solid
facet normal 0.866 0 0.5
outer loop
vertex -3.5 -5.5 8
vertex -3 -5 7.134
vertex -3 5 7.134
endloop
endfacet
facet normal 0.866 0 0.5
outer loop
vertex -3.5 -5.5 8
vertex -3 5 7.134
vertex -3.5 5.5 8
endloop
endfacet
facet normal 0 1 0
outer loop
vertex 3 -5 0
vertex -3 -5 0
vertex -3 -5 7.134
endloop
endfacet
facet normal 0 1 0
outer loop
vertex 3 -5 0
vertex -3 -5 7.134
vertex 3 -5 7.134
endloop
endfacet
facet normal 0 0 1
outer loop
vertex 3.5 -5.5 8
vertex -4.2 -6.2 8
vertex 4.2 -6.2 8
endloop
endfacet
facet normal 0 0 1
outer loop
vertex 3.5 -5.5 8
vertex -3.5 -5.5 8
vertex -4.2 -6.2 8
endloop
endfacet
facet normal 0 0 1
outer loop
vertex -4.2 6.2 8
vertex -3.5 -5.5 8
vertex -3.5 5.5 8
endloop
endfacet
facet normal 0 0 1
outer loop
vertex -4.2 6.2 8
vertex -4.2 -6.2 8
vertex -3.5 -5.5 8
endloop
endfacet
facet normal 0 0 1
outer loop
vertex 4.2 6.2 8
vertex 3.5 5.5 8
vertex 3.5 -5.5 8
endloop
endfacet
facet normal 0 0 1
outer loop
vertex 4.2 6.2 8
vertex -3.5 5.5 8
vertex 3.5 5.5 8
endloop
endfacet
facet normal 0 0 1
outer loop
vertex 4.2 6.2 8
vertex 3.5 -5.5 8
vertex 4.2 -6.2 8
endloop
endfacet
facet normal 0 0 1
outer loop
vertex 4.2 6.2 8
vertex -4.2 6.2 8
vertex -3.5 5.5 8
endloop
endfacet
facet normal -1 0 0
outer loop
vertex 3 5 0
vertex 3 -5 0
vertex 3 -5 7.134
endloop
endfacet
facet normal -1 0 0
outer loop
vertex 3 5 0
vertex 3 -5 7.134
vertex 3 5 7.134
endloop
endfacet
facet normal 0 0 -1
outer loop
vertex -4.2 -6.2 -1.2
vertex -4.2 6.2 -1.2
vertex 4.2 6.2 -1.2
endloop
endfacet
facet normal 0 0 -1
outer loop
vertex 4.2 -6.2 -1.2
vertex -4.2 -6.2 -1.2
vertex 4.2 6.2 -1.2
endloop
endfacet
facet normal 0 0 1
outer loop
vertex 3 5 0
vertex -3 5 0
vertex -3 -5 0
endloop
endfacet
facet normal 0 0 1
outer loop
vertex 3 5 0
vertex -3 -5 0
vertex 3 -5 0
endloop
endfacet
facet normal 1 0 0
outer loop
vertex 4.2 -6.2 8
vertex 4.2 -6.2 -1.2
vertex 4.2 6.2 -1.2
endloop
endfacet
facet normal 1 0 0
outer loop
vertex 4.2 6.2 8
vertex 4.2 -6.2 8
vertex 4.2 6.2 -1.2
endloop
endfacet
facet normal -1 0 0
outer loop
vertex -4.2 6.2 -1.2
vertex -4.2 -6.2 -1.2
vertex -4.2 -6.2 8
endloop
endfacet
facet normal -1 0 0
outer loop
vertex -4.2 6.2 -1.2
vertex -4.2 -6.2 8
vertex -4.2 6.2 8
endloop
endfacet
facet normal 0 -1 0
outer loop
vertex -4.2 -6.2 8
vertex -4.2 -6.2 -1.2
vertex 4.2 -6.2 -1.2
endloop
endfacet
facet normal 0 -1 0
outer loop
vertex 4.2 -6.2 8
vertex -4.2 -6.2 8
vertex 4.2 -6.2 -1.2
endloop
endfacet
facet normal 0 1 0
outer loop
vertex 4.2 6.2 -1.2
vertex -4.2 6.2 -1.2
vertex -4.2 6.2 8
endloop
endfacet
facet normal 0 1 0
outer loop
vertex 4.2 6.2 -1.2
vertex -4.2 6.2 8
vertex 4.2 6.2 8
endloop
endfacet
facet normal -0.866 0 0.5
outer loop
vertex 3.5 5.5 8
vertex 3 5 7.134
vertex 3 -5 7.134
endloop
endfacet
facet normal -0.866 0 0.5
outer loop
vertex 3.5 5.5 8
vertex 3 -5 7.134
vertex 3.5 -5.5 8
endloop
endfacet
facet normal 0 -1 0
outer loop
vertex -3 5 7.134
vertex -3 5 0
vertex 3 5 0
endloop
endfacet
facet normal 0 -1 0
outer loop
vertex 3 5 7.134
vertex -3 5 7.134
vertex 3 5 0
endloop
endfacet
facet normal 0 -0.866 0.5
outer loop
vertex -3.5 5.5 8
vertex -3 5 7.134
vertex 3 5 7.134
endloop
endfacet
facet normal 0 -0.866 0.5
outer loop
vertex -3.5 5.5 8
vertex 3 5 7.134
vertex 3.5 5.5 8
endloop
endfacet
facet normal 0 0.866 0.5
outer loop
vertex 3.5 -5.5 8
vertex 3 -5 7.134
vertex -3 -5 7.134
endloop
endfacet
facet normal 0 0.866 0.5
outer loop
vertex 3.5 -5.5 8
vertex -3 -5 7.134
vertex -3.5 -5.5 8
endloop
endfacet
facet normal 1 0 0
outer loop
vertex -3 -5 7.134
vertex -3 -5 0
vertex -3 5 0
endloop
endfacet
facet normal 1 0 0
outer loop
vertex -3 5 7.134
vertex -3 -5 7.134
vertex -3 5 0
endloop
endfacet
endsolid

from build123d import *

# Parameters (mm, degrees)
F0_W         = 6
F0_H         = 10
F1_DEPTH     = 8
F2_T         = 1.2
F3_T1_DEPTH  = 6
F3_T3_DEPTH  = 10
F3_T9_DEPTH  = 8.2404819853
F3_T13_DEPTH = 12.2404819853
F3_T20_DEPTH = 8.2404819853
F3_T24_DEPTH = 12.2404819853
F3_T31_DEPTH = 12.2404819853
F3_T35_DEPTH = 8.2404819853
F3_T42_DEPTH = 8.2404819853
F3_T46_DEPTH = 12.2404819853


# Not quite as in the source:
# - a fillet or chamfer that OpenCascade refuses, or shapes differently, is made with other operations: its cross-section is extruded or revolved along the edge and cut away or added


with BuildPart() as f1:
    # F0 (on Top) → F1 (new body)
    with BuildSketch(Plane.XY):
        Rectangle(F0_W, F0_H)
    extrude(amount=F1_DEPTH)

    # F2
    f2_openings = [f1.faces().sort_by_distance(p)[0] for p in [
        (0, 0, 8),
    ]]
    offset(amount=F2_T, openings=f2_openings, kind=Kind.INTERSECTION)

    # F3: chamfer of 0.5 x 0.8660254038 on 4 edges, made by hand

    # F3_s2 → F3_t1 (cut)
    with BuildSketch(Plane.YZ.offset(-3)):
        Polygon((5, 7.1339745962), (5.5, 8), (5, 8), align=None)
        Polygon((-5, 7.1339745962), (-5.5, 8), (-5, 8), align=None)
    extrude(amount=F3_T1_DEPTH, mode=Mode.SUBTRACT)

    # F3_s4 → F3_t3 (cut)
    with BuildSketch(Plane.XZ.offset(-5)):
        Polygon((-3, 7.1339745962), (-3.5, 8), (-3, 8), align=None)
        Polygon((3, 7.1339745962), (3.5, 8), (3, 8), align=None)
    extrude(amount=F3_T3_DEPTH, mode=Mode.SUBTRACT)


with BuildPart() as f3_tool7:
    # F3_s8 → F3_t9 (new body)
    with BuildSketch(Plane.YZ.offset(5.2404819853)):
        Polygon((5, 7.1339745962), (5.5, 8), (5, 8), align=None)
    extrude(amount=-F3_T9_DEPTH)

    split(bisect_by=Plane.YZ.offset(3), keep=Keep.TOP)


with BuildPart() as f3_tool11:
    # F3_s12 → F3_t13 (new body)
    with BuildSketch(Plane.XZ.offset(5)):
        Polygon((3, 7.1339745962), (3.5, 8), (3, 8), align=None)
    extrude(amount=-F3_T13_DEPTH)

    split(bisect_by=Plane.XZ.offset(-5), keep=Keep.BOTTOM)


with BuildPart() as f3_tool7_1:
    add(f3_tool7.part)

    # F3_t15: intersect F3_tool11
    add(f3_tool11.part, mode=Mode.INTERSECT)


with BuildPart() as f1_1:
    add(f1.part)

    # F3_t5: cut F3_tool7
    add(f3_tool7_1.part, mode=Mode.SUBTRACT)


with BuildPart() as f3_tool18:
    # F3_s19 → F3_t20 (new body)
    with BuildSketch(Plane.YZ.offset(3)):
        Polygon((5, 7.1339745962), (5.5, 8), (5, 8), align=None)
    extrude(amount=-F3_T20_DEPTH)

    split(bisect_by=Plane.YZ.offset(-3), keep=Keep.BOTTOM)


with BuildPart() as f3_tool22:
    # F3_s23 → F3_t24 (new body)
    with BuildSketch(Plane.XZ.offset(-7.2404819853)):
        Polygon((-3, 7.1339745962), (-3.5, 8), (-3, 8), align=None)
    extrude(amount=F3_T24_DEPTH)

    split(bisect_by=Plane.XZ.offset(-5), keep=Keep.BOTTOM)


with BuildPart() as f3_tool18_1:
    add(f3_tool18.part)

    # F3_t26: intersect F3_tool22
    add(f3_tool22.part, mode=Mode.INTERSECT)


with BuildPart() as f1_2:
    add(f1_1.part)

    # F3_t16: cut F3_tool18
    add(f3_tool18_1.part, mode=Mode.SUBTRACT)


with BuildPart() as f3_tool29:
    # F3_s30 → F3_t31 (new body)
    with BuildSketch(Plane.XZ.offset(-5)):
        Polygon((-3, 7.1339745962), (-3.5, 8), (-3, 8), align=None)
    extrude(amount=F3_T31_DEPTH)

    split(bisect_by=Plane.XZ.offset(5), keep=Keep.TOP)


with BuildPart() as f3_tool33:
    # F3_s34 → F3_t35 (new body)
    with BuildSketch(Plane.YZ.offset(-5.2404819853)):
        Polygon((-5, 7.1339745962), (-5.5, 8), (-5, 8), align=None)
    extrude(amount=F3_T35_DEPTH)

    split(bisect_by=Plane.YZ.offset(-3), keep=Keep.BOTTOM)


with BuildPart() as f3_tool29_1:
    add(f3_tool29.part)

    # F3_t37: intersect F3_tool33
    add(f3_tool33.part, mode=Mode.INTERSECT)


with BuildPart() as f1_3:
    add(f1_2.part)

    # F3_t27: cut F3_tool29
    add(f3_tool29_1.part, mode=Mode.SUBTRACT)


with BuildPart() as f3_tool40:
    # F3_s41 → F3_t42 (new body)
    with BuildSketch(Plane.YZ.offset(-3)):
        Polygon((-5, 7.1339745962), (-5.5, 8), (-5, 8), align=None)
    extrude(amount=F3_T42_DEPTH)

    split(bisect_by=Plane.YZ.offset(3), keep=Keep.TOP)


with BuildPart() as f3_tool44:
    # F3_s45 → F3_t46 (new body)
    with BuildSketch(Plane.XZ.offset(7.2404819853)):
        Polygon((3, 7.1339745962), (3.5, 8), (3, 8), align=None)
    extrude(amount=-F3_T46_DEPTH)

    split(bisect_by=Plane.XZ.offset(5), keep=Keep.TOP)


with BuildPart() as f3_tool40_1:
    add(f3_tool40.part)

    # F3_t48: intersect F3_tool44
    add(f3_tool44.part, mode=Mode.INTERSECT)


with BuildPart() as f1_4:
    add(f1_3.part)

    # F3_t38: cut F3_tool40
    add(f3_tool40_1.part, mode=Mode.SUBTRACT)


solid = f1_4.part
